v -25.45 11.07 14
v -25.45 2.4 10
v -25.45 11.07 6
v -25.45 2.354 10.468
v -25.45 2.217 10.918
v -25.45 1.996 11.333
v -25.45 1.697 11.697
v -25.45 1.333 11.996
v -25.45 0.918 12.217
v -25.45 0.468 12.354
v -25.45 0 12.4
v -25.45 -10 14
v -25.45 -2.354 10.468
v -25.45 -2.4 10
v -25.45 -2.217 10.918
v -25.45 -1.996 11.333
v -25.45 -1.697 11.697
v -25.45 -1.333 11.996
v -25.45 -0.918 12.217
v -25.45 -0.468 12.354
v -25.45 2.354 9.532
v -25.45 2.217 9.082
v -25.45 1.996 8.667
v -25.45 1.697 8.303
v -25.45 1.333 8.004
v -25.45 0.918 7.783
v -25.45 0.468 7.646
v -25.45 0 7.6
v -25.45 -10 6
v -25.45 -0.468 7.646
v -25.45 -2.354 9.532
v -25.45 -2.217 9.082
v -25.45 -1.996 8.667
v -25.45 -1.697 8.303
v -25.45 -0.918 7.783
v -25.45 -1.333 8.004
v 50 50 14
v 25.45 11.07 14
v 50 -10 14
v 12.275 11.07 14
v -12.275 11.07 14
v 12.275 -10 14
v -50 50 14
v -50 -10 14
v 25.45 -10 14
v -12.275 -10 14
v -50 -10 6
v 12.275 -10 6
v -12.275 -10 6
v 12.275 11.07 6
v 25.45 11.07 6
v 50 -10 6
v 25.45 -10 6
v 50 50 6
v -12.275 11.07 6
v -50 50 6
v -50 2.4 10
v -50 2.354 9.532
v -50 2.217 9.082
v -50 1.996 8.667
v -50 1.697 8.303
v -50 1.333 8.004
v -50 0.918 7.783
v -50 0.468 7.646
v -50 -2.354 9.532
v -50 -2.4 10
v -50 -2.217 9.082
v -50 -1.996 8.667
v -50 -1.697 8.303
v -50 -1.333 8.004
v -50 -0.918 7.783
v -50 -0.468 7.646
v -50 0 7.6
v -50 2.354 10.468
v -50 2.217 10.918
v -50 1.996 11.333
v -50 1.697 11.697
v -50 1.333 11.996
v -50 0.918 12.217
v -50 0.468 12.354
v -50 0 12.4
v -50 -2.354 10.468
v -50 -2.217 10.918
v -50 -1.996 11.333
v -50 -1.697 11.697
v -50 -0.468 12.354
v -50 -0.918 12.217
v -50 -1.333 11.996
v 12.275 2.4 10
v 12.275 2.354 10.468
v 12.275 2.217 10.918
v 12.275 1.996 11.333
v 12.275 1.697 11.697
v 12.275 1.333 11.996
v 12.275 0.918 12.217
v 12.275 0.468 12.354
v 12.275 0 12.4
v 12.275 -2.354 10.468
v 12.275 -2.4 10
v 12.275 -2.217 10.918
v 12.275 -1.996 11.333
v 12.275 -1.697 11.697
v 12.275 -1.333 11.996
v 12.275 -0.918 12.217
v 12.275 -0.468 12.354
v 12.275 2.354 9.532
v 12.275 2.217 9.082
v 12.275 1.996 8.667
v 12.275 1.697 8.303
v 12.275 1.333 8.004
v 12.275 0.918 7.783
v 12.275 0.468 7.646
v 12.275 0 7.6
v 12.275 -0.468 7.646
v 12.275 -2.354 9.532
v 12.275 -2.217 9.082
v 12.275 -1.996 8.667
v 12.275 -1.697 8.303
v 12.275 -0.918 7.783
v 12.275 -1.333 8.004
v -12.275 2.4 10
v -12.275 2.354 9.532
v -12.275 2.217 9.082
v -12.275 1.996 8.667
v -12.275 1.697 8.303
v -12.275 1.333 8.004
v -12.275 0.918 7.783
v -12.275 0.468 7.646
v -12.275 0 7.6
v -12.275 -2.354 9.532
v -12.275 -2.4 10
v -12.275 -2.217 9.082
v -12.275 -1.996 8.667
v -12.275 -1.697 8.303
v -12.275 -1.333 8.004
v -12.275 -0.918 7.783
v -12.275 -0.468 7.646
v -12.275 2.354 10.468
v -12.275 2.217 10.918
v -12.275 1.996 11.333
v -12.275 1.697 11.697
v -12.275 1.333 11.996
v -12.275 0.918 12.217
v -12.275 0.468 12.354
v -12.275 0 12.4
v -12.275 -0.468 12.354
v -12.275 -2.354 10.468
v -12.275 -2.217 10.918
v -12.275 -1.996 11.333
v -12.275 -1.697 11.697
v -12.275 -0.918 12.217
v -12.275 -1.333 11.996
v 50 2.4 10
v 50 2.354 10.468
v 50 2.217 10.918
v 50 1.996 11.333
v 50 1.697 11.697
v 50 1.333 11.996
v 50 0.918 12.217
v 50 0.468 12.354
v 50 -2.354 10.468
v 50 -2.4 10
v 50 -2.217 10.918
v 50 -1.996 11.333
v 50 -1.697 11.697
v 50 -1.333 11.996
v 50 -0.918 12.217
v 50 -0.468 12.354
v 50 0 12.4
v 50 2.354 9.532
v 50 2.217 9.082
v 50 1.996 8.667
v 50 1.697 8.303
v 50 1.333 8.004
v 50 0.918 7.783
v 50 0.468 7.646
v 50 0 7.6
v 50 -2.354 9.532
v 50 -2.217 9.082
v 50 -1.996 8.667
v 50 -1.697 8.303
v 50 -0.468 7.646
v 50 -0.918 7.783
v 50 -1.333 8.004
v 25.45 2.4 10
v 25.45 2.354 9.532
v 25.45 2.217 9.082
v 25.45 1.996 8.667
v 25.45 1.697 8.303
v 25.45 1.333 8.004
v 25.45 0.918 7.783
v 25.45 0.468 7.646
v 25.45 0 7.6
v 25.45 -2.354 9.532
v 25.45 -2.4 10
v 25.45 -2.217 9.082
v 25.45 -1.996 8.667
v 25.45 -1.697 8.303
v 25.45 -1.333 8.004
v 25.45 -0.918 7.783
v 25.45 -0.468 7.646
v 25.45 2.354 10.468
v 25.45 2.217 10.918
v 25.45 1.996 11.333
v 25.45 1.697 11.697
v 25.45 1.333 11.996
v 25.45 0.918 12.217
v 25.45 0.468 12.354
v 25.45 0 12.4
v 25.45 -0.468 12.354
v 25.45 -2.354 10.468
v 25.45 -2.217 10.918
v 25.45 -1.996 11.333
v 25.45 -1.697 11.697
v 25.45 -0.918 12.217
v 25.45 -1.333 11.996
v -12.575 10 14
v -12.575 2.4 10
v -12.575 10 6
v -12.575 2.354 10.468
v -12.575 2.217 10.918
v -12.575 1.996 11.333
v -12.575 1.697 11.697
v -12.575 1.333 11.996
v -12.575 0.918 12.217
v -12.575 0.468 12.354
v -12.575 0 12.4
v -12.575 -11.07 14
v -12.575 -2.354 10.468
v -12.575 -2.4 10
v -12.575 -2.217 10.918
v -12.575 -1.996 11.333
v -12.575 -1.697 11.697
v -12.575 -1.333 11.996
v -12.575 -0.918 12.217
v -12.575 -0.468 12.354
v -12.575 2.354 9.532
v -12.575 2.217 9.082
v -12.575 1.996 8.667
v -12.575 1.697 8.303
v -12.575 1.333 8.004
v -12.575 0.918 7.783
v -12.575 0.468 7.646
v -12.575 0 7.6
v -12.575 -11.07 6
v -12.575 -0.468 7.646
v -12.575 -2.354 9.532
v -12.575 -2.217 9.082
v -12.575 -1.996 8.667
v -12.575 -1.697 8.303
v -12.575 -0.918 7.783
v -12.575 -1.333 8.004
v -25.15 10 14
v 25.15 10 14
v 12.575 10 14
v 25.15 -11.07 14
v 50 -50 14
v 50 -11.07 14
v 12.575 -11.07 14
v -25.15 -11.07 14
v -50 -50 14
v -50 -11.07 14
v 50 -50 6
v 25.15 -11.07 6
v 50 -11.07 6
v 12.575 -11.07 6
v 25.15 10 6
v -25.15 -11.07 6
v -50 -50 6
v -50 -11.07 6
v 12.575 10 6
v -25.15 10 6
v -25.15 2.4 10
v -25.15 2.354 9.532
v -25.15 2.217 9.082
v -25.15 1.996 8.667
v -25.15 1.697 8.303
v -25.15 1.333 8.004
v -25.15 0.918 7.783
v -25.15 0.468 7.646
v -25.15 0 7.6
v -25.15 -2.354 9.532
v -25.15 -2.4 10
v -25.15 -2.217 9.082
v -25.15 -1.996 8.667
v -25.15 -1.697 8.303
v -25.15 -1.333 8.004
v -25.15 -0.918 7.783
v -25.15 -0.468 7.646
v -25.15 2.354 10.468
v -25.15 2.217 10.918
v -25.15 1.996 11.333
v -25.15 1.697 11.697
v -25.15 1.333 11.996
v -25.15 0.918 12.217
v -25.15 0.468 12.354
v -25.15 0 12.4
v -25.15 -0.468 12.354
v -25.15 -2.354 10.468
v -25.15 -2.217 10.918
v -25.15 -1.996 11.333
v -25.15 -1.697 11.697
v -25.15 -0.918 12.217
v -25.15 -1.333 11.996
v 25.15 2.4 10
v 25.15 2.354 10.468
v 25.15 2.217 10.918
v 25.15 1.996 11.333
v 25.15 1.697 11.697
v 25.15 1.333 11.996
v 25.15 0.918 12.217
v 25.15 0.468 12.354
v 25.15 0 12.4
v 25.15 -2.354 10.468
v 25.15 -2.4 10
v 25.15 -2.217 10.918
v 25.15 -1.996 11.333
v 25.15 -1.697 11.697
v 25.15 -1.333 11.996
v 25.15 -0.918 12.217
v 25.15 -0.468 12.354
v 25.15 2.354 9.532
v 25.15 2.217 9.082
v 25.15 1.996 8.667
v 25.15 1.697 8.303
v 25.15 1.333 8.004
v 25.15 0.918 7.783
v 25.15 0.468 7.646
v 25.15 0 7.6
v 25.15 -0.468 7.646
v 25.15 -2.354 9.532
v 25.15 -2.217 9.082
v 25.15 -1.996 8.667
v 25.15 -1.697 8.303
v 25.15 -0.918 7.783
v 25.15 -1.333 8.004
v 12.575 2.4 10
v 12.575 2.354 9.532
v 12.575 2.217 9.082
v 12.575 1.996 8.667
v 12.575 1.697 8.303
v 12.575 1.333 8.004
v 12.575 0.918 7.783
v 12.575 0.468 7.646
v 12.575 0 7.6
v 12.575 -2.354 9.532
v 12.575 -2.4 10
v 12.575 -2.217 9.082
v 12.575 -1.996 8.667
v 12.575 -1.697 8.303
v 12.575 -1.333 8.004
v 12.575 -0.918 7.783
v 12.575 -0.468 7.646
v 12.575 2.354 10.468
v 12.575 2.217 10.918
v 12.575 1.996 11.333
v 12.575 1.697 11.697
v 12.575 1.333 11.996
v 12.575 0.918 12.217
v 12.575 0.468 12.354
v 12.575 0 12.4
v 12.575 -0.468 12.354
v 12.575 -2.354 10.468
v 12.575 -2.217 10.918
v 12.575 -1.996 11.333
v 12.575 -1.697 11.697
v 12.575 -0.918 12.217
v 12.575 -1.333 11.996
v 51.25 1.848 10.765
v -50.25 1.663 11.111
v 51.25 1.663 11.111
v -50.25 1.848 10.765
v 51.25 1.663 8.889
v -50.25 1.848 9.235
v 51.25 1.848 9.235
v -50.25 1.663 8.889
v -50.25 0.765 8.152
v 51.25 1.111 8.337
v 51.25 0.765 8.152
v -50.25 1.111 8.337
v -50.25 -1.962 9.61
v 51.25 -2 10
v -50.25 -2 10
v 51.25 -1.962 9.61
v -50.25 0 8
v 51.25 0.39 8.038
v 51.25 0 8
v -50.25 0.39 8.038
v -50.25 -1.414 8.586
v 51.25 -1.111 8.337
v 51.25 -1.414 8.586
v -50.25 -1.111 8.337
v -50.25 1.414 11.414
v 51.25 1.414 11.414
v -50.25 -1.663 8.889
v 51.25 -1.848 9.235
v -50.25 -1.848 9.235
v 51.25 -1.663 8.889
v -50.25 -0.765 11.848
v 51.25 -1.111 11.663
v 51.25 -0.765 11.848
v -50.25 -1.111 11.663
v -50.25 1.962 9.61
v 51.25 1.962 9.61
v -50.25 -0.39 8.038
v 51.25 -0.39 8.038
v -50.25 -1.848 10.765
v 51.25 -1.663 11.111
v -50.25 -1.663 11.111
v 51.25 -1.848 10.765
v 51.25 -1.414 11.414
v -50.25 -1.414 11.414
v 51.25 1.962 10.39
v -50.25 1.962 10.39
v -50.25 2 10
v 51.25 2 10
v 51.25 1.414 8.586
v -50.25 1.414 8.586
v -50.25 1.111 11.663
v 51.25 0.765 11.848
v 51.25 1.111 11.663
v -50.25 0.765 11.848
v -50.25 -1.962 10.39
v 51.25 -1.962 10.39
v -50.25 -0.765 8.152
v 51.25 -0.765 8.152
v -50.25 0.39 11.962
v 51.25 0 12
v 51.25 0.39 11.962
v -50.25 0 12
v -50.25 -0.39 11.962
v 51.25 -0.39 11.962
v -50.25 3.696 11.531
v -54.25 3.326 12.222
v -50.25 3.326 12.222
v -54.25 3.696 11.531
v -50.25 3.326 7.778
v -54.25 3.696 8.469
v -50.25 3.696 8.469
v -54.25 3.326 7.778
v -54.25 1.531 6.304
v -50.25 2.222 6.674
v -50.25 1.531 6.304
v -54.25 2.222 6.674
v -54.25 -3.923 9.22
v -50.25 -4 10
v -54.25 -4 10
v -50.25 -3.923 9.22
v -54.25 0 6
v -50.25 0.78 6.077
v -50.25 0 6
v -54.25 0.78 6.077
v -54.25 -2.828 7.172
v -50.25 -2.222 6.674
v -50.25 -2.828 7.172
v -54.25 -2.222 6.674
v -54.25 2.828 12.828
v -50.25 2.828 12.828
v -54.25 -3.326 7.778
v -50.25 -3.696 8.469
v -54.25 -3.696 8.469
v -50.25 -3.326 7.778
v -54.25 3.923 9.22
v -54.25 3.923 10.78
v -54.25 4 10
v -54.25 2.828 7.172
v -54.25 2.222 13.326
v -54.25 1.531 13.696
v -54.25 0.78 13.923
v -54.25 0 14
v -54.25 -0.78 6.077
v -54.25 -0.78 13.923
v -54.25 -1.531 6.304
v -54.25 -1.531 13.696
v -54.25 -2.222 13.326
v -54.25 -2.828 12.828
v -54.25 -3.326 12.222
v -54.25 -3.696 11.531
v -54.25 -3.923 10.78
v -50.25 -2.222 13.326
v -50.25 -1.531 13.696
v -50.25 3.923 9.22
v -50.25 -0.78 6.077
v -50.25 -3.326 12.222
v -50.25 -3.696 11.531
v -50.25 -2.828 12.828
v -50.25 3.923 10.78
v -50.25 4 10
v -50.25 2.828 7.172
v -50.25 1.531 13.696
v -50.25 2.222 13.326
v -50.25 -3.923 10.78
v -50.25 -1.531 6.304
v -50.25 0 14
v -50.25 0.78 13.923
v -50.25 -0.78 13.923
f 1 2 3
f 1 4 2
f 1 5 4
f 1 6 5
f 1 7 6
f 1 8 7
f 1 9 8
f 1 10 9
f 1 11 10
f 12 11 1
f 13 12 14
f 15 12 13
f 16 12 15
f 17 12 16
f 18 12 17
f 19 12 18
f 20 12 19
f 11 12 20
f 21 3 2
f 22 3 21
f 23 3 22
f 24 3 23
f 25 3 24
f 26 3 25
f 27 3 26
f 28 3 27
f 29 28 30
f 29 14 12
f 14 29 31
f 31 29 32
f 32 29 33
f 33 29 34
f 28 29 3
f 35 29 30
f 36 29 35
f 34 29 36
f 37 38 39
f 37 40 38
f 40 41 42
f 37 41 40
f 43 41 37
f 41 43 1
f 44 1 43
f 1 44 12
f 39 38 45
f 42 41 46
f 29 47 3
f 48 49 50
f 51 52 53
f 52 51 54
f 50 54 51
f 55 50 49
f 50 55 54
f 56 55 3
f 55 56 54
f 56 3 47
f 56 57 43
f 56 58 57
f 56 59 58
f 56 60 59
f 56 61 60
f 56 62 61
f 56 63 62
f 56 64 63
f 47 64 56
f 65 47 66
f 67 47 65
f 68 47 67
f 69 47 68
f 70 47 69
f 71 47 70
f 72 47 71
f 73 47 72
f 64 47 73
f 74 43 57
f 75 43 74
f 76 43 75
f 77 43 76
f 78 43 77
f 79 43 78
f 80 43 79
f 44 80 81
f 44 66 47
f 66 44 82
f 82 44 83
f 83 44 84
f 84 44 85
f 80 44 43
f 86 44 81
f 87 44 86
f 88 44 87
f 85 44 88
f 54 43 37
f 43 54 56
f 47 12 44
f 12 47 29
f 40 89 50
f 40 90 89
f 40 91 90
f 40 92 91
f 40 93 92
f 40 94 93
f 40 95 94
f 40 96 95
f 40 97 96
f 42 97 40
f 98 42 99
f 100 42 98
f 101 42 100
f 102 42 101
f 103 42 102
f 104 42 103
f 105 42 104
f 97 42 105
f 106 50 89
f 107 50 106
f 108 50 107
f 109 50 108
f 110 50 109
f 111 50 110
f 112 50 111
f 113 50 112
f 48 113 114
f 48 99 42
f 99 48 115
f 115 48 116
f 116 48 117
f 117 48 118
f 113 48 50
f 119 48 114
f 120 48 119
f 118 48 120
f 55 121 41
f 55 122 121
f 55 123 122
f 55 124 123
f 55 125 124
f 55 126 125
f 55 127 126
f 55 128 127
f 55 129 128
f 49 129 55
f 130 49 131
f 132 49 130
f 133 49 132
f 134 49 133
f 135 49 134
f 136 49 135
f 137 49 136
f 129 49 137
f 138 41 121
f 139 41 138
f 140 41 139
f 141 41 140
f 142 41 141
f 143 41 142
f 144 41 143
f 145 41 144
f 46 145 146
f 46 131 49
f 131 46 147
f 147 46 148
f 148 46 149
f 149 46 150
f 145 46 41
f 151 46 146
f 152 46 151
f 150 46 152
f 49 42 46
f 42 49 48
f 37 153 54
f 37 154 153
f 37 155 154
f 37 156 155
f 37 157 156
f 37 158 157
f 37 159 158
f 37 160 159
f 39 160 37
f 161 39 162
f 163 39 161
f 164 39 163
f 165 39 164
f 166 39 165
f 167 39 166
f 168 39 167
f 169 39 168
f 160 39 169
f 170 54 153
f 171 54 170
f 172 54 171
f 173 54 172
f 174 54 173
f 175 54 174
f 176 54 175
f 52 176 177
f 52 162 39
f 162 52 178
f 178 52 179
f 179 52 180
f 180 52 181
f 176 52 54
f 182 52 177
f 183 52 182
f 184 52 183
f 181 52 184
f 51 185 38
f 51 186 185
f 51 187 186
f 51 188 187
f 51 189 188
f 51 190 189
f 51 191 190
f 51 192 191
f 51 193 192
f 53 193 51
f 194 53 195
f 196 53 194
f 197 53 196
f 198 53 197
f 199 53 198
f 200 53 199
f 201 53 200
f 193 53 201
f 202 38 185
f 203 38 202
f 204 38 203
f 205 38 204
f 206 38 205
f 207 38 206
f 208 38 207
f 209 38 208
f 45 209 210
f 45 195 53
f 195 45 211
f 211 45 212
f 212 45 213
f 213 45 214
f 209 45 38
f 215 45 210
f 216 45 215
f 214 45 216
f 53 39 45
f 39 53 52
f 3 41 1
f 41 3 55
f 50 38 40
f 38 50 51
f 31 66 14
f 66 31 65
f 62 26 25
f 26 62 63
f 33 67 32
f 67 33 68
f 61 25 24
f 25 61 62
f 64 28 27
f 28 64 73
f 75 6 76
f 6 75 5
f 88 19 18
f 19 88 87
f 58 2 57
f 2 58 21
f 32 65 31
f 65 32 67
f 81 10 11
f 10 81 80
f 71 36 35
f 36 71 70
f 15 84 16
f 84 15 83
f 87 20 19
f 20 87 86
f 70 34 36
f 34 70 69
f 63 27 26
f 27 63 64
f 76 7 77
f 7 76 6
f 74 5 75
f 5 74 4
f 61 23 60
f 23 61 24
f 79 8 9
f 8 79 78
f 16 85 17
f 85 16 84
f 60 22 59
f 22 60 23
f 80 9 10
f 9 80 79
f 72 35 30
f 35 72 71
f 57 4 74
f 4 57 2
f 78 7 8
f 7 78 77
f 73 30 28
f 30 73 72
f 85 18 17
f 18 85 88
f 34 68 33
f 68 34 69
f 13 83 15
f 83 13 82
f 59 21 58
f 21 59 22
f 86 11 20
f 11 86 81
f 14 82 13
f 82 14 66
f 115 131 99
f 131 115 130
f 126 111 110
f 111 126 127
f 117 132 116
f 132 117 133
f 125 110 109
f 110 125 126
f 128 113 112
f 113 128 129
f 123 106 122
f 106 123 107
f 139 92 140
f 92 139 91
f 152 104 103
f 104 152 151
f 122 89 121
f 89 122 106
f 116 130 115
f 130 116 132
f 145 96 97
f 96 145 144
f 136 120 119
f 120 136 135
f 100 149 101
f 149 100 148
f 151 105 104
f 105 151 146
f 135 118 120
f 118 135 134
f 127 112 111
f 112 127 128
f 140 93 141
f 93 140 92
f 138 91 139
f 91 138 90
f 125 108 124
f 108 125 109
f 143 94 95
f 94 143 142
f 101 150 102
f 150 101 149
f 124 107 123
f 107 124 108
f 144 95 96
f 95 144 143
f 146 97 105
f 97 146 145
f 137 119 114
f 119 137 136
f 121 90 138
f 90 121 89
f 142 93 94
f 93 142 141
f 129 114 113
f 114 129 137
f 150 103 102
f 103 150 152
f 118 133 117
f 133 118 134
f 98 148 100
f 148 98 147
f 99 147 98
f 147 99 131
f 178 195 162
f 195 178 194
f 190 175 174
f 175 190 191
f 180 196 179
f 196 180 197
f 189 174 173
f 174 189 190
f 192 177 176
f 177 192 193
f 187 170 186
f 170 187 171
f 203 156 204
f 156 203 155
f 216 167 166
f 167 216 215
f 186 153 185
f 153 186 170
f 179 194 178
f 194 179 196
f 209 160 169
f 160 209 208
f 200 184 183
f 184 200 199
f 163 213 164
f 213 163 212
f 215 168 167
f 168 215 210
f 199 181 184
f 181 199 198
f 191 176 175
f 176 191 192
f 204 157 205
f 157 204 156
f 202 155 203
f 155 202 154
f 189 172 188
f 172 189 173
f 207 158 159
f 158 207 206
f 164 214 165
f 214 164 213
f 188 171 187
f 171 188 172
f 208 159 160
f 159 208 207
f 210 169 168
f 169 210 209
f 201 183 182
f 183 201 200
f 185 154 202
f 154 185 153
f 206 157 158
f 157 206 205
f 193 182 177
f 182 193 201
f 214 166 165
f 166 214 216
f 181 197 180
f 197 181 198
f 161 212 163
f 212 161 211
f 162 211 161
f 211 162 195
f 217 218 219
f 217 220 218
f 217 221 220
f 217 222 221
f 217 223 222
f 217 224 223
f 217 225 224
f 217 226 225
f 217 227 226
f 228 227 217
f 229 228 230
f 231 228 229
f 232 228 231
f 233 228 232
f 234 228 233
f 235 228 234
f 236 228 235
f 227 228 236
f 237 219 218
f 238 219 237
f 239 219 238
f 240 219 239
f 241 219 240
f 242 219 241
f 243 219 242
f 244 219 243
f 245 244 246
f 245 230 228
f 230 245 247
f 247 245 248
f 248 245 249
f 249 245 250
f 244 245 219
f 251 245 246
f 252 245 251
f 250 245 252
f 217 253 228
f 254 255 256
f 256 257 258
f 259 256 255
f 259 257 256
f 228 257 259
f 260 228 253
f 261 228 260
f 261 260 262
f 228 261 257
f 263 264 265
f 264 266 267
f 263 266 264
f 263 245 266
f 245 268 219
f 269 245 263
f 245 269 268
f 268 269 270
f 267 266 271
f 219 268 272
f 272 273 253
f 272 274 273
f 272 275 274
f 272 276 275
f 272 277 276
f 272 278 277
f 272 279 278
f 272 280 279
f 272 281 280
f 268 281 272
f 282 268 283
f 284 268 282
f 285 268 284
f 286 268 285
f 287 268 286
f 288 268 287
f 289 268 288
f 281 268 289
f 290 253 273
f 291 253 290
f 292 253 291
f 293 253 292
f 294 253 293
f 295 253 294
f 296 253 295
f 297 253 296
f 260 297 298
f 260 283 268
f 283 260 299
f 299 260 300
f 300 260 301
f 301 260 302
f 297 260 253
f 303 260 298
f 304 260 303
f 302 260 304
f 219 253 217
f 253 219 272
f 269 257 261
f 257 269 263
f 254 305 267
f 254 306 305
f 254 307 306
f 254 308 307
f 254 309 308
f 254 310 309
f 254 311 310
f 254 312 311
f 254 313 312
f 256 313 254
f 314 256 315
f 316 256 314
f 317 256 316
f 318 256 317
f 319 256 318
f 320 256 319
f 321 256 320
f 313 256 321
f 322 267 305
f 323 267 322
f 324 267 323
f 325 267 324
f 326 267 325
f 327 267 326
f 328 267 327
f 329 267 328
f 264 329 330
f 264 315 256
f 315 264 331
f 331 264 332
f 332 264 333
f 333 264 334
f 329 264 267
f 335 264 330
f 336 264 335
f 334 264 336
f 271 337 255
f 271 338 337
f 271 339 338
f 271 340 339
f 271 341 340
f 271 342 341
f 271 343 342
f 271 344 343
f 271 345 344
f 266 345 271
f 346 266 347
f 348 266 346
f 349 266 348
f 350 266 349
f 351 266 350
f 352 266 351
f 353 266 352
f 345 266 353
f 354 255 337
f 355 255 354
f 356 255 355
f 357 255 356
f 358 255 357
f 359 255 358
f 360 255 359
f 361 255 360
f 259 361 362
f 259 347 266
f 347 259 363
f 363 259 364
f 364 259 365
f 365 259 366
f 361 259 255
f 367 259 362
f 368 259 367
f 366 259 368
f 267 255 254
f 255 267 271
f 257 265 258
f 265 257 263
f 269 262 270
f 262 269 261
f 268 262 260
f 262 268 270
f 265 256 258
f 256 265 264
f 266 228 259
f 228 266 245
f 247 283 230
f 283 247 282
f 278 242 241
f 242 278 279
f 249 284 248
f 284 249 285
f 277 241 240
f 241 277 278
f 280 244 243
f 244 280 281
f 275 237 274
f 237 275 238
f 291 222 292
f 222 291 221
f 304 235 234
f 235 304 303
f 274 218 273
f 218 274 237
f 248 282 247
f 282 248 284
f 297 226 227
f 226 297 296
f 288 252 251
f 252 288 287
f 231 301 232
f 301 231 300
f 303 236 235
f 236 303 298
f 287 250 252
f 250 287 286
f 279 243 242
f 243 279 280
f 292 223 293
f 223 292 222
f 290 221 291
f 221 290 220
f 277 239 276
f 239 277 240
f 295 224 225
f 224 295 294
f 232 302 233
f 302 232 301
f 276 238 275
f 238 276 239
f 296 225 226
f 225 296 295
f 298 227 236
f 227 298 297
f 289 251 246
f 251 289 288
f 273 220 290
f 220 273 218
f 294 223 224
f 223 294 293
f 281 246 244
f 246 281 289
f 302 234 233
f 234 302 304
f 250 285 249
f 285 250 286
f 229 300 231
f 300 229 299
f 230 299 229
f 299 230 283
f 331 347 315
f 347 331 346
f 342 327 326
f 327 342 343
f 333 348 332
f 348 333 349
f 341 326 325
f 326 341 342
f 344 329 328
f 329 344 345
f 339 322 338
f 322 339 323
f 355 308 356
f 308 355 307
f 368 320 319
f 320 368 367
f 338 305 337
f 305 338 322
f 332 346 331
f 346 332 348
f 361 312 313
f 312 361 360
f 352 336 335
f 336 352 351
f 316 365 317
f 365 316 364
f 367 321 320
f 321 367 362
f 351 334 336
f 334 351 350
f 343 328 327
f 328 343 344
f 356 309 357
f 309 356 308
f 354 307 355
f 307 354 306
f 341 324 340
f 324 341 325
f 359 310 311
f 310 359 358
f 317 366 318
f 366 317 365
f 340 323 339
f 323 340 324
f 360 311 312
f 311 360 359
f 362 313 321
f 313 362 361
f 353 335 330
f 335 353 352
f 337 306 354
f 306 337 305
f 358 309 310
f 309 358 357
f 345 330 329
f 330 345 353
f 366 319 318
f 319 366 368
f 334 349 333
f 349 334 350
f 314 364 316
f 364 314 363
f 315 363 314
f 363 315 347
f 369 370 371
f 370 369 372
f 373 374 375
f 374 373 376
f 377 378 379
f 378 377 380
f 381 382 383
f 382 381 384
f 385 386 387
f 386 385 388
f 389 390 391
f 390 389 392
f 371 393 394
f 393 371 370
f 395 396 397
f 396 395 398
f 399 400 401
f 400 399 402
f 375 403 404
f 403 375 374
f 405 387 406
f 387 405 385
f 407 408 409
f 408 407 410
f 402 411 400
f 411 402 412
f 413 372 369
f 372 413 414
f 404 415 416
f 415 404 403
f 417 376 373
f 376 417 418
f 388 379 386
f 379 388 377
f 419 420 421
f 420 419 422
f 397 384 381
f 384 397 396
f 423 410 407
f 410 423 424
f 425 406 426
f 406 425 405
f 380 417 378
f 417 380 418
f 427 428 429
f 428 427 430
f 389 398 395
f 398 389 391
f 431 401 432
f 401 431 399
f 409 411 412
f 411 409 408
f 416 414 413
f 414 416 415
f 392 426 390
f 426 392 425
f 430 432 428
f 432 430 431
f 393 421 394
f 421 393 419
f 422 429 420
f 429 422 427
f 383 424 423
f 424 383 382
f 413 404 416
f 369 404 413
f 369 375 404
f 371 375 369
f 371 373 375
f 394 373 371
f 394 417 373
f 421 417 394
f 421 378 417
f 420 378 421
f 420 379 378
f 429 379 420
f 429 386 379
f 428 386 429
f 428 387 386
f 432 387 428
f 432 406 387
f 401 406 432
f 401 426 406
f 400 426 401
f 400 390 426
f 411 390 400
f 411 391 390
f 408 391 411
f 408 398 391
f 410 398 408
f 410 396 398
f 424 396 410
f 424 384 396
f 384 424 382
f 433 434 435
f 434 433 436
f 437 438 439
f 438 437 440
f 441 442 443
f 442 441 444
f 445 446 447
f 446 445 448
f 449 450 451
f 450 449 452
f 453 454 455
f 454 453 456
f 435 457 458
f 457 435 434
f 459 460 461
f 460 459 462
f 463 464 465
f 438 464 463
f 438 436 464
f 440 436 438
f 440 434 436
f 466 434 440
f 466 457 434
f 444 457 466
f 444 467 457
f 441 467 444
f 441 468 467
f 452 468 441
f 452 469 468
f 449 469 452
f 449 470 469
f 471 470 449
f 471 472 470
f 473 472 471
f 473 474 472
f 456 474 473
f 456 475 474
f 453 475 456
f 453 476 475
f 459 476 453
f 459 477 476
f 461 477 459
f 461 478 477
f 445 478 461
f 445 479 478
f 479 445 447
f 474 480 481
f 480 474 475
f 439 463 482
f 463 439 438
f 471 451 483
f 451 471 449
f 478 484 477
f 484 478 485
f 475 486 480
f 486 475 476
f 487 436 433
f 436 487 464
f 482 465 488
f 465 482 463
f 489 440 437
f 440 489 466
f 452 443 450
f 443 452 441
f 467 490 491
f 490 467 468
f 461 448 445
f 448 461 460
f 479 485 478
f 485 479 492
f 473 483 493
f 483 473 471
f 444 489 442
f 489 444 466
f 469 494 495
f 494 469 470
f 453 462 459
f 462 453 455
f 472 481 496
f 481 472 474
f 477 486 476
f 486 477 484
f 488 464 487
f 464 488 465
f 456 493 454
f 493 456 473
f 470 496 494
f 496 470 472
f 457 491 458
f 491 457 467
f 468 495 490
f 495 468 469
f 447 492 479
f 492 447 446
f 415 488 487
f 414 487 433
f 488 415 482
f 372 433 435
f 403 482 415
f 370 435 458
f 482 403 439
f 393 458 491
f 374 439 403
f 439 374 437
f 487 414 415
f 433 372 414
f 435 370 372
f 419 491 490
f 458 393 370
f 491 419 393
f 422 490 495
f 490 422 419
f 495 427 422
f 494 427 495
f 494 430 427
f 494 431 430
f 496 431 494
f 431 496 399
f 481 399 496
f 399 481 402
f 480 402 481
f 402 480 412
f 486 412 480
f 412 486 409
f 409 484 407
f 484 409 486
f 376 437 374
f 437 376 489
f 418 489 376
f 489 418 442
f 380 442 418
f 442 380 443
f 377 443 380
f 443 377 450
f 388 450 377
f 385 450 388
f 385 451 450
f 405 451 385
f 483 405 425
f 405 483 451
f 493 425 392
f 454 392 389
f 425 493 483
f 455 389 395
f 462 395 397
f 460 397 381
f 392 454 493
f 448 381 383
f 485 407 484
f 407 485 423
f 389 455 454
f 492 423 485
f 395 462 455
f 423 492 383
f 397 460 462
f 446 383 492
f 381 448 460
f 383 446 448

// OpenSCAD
$fn = 32;

// ------------------------------------------------------------------------
// Butt hinge: hinge 100 mm, leaf swung 0 deg
// Every part is its own module, assembly() places every instance.
// ------------------------------------------------------------------------

// --- part 1 ---
module hinge_base() {
  difference() {
    union() {
      translate([-50, -10, -4]) cube([24.55, 60, 8]);
      translate([-12.275, -10, -4]) cube([24.55, 60, 8]);
      translate([25.45, -10, -4]) cube([24.55, 60, 8]);
      translate([-50, 11.07, -4]) cube([100, 38.93, 8]);
    }
    translate([-37.725, 0, 0]) rotate([0, 90, 0]) cylinder(h = 26.55, d = 4.8, center = true);
    translate([0, 0, 0]) rotate([0, 90, 0]) cylinder(h = 26.55, d = 4.8, center = true);
    translate([37.725, 0, 0]) rotate([0, 90, 0]) cylinder(h = 26.55, d = 4.8, center = true);
  }
}

// --- part 2 ---
module hinge_mover() {
  difference() {
    union() {
      translate([-25.15, -50, -4]) cube([12.575, 60, 8]);
      translate([12.575, -50, -4]) cube([12.575, 60, 8]);
      translate([-50, -50, -4]) cube([100, 38.93, 8]);
    }
    translate([-18.863, 0, 0]) rotate([0, 90, 0]) cylinder(h = 14.575, d = 4.8, center = true);
    translate([18.863, 0, 0]) rotate([0, 90, 0]) cylinder(h = 14.575, d = 4.8, center = true);
  }
}

// --- part 3 ---
module hinge_pin() {
  rotate([0, 90, 0]) cylinder(h = 102.5, d = 4, center = true);
  translate([-54.25, 0, 0]) rotate([0, 90, 0]) cylinder(h = 4, d = 8);
}

// --- assembly ---
module assembly() {
  color([0.80, 0.24, 0.20]) translate([0, 0, 10]) rotate([0, 0, 0]) hinge_base();
  color([0.20, 0.45, 0.75]) translate([0, 0, 10]) rotate([0, 0, 0]) hinge_mover();
  color([0.25, 0.62, 0.32]) translate([0, 0, 10]) rotate([0, 0, 0]) hinge_pin();
}

assembly();
